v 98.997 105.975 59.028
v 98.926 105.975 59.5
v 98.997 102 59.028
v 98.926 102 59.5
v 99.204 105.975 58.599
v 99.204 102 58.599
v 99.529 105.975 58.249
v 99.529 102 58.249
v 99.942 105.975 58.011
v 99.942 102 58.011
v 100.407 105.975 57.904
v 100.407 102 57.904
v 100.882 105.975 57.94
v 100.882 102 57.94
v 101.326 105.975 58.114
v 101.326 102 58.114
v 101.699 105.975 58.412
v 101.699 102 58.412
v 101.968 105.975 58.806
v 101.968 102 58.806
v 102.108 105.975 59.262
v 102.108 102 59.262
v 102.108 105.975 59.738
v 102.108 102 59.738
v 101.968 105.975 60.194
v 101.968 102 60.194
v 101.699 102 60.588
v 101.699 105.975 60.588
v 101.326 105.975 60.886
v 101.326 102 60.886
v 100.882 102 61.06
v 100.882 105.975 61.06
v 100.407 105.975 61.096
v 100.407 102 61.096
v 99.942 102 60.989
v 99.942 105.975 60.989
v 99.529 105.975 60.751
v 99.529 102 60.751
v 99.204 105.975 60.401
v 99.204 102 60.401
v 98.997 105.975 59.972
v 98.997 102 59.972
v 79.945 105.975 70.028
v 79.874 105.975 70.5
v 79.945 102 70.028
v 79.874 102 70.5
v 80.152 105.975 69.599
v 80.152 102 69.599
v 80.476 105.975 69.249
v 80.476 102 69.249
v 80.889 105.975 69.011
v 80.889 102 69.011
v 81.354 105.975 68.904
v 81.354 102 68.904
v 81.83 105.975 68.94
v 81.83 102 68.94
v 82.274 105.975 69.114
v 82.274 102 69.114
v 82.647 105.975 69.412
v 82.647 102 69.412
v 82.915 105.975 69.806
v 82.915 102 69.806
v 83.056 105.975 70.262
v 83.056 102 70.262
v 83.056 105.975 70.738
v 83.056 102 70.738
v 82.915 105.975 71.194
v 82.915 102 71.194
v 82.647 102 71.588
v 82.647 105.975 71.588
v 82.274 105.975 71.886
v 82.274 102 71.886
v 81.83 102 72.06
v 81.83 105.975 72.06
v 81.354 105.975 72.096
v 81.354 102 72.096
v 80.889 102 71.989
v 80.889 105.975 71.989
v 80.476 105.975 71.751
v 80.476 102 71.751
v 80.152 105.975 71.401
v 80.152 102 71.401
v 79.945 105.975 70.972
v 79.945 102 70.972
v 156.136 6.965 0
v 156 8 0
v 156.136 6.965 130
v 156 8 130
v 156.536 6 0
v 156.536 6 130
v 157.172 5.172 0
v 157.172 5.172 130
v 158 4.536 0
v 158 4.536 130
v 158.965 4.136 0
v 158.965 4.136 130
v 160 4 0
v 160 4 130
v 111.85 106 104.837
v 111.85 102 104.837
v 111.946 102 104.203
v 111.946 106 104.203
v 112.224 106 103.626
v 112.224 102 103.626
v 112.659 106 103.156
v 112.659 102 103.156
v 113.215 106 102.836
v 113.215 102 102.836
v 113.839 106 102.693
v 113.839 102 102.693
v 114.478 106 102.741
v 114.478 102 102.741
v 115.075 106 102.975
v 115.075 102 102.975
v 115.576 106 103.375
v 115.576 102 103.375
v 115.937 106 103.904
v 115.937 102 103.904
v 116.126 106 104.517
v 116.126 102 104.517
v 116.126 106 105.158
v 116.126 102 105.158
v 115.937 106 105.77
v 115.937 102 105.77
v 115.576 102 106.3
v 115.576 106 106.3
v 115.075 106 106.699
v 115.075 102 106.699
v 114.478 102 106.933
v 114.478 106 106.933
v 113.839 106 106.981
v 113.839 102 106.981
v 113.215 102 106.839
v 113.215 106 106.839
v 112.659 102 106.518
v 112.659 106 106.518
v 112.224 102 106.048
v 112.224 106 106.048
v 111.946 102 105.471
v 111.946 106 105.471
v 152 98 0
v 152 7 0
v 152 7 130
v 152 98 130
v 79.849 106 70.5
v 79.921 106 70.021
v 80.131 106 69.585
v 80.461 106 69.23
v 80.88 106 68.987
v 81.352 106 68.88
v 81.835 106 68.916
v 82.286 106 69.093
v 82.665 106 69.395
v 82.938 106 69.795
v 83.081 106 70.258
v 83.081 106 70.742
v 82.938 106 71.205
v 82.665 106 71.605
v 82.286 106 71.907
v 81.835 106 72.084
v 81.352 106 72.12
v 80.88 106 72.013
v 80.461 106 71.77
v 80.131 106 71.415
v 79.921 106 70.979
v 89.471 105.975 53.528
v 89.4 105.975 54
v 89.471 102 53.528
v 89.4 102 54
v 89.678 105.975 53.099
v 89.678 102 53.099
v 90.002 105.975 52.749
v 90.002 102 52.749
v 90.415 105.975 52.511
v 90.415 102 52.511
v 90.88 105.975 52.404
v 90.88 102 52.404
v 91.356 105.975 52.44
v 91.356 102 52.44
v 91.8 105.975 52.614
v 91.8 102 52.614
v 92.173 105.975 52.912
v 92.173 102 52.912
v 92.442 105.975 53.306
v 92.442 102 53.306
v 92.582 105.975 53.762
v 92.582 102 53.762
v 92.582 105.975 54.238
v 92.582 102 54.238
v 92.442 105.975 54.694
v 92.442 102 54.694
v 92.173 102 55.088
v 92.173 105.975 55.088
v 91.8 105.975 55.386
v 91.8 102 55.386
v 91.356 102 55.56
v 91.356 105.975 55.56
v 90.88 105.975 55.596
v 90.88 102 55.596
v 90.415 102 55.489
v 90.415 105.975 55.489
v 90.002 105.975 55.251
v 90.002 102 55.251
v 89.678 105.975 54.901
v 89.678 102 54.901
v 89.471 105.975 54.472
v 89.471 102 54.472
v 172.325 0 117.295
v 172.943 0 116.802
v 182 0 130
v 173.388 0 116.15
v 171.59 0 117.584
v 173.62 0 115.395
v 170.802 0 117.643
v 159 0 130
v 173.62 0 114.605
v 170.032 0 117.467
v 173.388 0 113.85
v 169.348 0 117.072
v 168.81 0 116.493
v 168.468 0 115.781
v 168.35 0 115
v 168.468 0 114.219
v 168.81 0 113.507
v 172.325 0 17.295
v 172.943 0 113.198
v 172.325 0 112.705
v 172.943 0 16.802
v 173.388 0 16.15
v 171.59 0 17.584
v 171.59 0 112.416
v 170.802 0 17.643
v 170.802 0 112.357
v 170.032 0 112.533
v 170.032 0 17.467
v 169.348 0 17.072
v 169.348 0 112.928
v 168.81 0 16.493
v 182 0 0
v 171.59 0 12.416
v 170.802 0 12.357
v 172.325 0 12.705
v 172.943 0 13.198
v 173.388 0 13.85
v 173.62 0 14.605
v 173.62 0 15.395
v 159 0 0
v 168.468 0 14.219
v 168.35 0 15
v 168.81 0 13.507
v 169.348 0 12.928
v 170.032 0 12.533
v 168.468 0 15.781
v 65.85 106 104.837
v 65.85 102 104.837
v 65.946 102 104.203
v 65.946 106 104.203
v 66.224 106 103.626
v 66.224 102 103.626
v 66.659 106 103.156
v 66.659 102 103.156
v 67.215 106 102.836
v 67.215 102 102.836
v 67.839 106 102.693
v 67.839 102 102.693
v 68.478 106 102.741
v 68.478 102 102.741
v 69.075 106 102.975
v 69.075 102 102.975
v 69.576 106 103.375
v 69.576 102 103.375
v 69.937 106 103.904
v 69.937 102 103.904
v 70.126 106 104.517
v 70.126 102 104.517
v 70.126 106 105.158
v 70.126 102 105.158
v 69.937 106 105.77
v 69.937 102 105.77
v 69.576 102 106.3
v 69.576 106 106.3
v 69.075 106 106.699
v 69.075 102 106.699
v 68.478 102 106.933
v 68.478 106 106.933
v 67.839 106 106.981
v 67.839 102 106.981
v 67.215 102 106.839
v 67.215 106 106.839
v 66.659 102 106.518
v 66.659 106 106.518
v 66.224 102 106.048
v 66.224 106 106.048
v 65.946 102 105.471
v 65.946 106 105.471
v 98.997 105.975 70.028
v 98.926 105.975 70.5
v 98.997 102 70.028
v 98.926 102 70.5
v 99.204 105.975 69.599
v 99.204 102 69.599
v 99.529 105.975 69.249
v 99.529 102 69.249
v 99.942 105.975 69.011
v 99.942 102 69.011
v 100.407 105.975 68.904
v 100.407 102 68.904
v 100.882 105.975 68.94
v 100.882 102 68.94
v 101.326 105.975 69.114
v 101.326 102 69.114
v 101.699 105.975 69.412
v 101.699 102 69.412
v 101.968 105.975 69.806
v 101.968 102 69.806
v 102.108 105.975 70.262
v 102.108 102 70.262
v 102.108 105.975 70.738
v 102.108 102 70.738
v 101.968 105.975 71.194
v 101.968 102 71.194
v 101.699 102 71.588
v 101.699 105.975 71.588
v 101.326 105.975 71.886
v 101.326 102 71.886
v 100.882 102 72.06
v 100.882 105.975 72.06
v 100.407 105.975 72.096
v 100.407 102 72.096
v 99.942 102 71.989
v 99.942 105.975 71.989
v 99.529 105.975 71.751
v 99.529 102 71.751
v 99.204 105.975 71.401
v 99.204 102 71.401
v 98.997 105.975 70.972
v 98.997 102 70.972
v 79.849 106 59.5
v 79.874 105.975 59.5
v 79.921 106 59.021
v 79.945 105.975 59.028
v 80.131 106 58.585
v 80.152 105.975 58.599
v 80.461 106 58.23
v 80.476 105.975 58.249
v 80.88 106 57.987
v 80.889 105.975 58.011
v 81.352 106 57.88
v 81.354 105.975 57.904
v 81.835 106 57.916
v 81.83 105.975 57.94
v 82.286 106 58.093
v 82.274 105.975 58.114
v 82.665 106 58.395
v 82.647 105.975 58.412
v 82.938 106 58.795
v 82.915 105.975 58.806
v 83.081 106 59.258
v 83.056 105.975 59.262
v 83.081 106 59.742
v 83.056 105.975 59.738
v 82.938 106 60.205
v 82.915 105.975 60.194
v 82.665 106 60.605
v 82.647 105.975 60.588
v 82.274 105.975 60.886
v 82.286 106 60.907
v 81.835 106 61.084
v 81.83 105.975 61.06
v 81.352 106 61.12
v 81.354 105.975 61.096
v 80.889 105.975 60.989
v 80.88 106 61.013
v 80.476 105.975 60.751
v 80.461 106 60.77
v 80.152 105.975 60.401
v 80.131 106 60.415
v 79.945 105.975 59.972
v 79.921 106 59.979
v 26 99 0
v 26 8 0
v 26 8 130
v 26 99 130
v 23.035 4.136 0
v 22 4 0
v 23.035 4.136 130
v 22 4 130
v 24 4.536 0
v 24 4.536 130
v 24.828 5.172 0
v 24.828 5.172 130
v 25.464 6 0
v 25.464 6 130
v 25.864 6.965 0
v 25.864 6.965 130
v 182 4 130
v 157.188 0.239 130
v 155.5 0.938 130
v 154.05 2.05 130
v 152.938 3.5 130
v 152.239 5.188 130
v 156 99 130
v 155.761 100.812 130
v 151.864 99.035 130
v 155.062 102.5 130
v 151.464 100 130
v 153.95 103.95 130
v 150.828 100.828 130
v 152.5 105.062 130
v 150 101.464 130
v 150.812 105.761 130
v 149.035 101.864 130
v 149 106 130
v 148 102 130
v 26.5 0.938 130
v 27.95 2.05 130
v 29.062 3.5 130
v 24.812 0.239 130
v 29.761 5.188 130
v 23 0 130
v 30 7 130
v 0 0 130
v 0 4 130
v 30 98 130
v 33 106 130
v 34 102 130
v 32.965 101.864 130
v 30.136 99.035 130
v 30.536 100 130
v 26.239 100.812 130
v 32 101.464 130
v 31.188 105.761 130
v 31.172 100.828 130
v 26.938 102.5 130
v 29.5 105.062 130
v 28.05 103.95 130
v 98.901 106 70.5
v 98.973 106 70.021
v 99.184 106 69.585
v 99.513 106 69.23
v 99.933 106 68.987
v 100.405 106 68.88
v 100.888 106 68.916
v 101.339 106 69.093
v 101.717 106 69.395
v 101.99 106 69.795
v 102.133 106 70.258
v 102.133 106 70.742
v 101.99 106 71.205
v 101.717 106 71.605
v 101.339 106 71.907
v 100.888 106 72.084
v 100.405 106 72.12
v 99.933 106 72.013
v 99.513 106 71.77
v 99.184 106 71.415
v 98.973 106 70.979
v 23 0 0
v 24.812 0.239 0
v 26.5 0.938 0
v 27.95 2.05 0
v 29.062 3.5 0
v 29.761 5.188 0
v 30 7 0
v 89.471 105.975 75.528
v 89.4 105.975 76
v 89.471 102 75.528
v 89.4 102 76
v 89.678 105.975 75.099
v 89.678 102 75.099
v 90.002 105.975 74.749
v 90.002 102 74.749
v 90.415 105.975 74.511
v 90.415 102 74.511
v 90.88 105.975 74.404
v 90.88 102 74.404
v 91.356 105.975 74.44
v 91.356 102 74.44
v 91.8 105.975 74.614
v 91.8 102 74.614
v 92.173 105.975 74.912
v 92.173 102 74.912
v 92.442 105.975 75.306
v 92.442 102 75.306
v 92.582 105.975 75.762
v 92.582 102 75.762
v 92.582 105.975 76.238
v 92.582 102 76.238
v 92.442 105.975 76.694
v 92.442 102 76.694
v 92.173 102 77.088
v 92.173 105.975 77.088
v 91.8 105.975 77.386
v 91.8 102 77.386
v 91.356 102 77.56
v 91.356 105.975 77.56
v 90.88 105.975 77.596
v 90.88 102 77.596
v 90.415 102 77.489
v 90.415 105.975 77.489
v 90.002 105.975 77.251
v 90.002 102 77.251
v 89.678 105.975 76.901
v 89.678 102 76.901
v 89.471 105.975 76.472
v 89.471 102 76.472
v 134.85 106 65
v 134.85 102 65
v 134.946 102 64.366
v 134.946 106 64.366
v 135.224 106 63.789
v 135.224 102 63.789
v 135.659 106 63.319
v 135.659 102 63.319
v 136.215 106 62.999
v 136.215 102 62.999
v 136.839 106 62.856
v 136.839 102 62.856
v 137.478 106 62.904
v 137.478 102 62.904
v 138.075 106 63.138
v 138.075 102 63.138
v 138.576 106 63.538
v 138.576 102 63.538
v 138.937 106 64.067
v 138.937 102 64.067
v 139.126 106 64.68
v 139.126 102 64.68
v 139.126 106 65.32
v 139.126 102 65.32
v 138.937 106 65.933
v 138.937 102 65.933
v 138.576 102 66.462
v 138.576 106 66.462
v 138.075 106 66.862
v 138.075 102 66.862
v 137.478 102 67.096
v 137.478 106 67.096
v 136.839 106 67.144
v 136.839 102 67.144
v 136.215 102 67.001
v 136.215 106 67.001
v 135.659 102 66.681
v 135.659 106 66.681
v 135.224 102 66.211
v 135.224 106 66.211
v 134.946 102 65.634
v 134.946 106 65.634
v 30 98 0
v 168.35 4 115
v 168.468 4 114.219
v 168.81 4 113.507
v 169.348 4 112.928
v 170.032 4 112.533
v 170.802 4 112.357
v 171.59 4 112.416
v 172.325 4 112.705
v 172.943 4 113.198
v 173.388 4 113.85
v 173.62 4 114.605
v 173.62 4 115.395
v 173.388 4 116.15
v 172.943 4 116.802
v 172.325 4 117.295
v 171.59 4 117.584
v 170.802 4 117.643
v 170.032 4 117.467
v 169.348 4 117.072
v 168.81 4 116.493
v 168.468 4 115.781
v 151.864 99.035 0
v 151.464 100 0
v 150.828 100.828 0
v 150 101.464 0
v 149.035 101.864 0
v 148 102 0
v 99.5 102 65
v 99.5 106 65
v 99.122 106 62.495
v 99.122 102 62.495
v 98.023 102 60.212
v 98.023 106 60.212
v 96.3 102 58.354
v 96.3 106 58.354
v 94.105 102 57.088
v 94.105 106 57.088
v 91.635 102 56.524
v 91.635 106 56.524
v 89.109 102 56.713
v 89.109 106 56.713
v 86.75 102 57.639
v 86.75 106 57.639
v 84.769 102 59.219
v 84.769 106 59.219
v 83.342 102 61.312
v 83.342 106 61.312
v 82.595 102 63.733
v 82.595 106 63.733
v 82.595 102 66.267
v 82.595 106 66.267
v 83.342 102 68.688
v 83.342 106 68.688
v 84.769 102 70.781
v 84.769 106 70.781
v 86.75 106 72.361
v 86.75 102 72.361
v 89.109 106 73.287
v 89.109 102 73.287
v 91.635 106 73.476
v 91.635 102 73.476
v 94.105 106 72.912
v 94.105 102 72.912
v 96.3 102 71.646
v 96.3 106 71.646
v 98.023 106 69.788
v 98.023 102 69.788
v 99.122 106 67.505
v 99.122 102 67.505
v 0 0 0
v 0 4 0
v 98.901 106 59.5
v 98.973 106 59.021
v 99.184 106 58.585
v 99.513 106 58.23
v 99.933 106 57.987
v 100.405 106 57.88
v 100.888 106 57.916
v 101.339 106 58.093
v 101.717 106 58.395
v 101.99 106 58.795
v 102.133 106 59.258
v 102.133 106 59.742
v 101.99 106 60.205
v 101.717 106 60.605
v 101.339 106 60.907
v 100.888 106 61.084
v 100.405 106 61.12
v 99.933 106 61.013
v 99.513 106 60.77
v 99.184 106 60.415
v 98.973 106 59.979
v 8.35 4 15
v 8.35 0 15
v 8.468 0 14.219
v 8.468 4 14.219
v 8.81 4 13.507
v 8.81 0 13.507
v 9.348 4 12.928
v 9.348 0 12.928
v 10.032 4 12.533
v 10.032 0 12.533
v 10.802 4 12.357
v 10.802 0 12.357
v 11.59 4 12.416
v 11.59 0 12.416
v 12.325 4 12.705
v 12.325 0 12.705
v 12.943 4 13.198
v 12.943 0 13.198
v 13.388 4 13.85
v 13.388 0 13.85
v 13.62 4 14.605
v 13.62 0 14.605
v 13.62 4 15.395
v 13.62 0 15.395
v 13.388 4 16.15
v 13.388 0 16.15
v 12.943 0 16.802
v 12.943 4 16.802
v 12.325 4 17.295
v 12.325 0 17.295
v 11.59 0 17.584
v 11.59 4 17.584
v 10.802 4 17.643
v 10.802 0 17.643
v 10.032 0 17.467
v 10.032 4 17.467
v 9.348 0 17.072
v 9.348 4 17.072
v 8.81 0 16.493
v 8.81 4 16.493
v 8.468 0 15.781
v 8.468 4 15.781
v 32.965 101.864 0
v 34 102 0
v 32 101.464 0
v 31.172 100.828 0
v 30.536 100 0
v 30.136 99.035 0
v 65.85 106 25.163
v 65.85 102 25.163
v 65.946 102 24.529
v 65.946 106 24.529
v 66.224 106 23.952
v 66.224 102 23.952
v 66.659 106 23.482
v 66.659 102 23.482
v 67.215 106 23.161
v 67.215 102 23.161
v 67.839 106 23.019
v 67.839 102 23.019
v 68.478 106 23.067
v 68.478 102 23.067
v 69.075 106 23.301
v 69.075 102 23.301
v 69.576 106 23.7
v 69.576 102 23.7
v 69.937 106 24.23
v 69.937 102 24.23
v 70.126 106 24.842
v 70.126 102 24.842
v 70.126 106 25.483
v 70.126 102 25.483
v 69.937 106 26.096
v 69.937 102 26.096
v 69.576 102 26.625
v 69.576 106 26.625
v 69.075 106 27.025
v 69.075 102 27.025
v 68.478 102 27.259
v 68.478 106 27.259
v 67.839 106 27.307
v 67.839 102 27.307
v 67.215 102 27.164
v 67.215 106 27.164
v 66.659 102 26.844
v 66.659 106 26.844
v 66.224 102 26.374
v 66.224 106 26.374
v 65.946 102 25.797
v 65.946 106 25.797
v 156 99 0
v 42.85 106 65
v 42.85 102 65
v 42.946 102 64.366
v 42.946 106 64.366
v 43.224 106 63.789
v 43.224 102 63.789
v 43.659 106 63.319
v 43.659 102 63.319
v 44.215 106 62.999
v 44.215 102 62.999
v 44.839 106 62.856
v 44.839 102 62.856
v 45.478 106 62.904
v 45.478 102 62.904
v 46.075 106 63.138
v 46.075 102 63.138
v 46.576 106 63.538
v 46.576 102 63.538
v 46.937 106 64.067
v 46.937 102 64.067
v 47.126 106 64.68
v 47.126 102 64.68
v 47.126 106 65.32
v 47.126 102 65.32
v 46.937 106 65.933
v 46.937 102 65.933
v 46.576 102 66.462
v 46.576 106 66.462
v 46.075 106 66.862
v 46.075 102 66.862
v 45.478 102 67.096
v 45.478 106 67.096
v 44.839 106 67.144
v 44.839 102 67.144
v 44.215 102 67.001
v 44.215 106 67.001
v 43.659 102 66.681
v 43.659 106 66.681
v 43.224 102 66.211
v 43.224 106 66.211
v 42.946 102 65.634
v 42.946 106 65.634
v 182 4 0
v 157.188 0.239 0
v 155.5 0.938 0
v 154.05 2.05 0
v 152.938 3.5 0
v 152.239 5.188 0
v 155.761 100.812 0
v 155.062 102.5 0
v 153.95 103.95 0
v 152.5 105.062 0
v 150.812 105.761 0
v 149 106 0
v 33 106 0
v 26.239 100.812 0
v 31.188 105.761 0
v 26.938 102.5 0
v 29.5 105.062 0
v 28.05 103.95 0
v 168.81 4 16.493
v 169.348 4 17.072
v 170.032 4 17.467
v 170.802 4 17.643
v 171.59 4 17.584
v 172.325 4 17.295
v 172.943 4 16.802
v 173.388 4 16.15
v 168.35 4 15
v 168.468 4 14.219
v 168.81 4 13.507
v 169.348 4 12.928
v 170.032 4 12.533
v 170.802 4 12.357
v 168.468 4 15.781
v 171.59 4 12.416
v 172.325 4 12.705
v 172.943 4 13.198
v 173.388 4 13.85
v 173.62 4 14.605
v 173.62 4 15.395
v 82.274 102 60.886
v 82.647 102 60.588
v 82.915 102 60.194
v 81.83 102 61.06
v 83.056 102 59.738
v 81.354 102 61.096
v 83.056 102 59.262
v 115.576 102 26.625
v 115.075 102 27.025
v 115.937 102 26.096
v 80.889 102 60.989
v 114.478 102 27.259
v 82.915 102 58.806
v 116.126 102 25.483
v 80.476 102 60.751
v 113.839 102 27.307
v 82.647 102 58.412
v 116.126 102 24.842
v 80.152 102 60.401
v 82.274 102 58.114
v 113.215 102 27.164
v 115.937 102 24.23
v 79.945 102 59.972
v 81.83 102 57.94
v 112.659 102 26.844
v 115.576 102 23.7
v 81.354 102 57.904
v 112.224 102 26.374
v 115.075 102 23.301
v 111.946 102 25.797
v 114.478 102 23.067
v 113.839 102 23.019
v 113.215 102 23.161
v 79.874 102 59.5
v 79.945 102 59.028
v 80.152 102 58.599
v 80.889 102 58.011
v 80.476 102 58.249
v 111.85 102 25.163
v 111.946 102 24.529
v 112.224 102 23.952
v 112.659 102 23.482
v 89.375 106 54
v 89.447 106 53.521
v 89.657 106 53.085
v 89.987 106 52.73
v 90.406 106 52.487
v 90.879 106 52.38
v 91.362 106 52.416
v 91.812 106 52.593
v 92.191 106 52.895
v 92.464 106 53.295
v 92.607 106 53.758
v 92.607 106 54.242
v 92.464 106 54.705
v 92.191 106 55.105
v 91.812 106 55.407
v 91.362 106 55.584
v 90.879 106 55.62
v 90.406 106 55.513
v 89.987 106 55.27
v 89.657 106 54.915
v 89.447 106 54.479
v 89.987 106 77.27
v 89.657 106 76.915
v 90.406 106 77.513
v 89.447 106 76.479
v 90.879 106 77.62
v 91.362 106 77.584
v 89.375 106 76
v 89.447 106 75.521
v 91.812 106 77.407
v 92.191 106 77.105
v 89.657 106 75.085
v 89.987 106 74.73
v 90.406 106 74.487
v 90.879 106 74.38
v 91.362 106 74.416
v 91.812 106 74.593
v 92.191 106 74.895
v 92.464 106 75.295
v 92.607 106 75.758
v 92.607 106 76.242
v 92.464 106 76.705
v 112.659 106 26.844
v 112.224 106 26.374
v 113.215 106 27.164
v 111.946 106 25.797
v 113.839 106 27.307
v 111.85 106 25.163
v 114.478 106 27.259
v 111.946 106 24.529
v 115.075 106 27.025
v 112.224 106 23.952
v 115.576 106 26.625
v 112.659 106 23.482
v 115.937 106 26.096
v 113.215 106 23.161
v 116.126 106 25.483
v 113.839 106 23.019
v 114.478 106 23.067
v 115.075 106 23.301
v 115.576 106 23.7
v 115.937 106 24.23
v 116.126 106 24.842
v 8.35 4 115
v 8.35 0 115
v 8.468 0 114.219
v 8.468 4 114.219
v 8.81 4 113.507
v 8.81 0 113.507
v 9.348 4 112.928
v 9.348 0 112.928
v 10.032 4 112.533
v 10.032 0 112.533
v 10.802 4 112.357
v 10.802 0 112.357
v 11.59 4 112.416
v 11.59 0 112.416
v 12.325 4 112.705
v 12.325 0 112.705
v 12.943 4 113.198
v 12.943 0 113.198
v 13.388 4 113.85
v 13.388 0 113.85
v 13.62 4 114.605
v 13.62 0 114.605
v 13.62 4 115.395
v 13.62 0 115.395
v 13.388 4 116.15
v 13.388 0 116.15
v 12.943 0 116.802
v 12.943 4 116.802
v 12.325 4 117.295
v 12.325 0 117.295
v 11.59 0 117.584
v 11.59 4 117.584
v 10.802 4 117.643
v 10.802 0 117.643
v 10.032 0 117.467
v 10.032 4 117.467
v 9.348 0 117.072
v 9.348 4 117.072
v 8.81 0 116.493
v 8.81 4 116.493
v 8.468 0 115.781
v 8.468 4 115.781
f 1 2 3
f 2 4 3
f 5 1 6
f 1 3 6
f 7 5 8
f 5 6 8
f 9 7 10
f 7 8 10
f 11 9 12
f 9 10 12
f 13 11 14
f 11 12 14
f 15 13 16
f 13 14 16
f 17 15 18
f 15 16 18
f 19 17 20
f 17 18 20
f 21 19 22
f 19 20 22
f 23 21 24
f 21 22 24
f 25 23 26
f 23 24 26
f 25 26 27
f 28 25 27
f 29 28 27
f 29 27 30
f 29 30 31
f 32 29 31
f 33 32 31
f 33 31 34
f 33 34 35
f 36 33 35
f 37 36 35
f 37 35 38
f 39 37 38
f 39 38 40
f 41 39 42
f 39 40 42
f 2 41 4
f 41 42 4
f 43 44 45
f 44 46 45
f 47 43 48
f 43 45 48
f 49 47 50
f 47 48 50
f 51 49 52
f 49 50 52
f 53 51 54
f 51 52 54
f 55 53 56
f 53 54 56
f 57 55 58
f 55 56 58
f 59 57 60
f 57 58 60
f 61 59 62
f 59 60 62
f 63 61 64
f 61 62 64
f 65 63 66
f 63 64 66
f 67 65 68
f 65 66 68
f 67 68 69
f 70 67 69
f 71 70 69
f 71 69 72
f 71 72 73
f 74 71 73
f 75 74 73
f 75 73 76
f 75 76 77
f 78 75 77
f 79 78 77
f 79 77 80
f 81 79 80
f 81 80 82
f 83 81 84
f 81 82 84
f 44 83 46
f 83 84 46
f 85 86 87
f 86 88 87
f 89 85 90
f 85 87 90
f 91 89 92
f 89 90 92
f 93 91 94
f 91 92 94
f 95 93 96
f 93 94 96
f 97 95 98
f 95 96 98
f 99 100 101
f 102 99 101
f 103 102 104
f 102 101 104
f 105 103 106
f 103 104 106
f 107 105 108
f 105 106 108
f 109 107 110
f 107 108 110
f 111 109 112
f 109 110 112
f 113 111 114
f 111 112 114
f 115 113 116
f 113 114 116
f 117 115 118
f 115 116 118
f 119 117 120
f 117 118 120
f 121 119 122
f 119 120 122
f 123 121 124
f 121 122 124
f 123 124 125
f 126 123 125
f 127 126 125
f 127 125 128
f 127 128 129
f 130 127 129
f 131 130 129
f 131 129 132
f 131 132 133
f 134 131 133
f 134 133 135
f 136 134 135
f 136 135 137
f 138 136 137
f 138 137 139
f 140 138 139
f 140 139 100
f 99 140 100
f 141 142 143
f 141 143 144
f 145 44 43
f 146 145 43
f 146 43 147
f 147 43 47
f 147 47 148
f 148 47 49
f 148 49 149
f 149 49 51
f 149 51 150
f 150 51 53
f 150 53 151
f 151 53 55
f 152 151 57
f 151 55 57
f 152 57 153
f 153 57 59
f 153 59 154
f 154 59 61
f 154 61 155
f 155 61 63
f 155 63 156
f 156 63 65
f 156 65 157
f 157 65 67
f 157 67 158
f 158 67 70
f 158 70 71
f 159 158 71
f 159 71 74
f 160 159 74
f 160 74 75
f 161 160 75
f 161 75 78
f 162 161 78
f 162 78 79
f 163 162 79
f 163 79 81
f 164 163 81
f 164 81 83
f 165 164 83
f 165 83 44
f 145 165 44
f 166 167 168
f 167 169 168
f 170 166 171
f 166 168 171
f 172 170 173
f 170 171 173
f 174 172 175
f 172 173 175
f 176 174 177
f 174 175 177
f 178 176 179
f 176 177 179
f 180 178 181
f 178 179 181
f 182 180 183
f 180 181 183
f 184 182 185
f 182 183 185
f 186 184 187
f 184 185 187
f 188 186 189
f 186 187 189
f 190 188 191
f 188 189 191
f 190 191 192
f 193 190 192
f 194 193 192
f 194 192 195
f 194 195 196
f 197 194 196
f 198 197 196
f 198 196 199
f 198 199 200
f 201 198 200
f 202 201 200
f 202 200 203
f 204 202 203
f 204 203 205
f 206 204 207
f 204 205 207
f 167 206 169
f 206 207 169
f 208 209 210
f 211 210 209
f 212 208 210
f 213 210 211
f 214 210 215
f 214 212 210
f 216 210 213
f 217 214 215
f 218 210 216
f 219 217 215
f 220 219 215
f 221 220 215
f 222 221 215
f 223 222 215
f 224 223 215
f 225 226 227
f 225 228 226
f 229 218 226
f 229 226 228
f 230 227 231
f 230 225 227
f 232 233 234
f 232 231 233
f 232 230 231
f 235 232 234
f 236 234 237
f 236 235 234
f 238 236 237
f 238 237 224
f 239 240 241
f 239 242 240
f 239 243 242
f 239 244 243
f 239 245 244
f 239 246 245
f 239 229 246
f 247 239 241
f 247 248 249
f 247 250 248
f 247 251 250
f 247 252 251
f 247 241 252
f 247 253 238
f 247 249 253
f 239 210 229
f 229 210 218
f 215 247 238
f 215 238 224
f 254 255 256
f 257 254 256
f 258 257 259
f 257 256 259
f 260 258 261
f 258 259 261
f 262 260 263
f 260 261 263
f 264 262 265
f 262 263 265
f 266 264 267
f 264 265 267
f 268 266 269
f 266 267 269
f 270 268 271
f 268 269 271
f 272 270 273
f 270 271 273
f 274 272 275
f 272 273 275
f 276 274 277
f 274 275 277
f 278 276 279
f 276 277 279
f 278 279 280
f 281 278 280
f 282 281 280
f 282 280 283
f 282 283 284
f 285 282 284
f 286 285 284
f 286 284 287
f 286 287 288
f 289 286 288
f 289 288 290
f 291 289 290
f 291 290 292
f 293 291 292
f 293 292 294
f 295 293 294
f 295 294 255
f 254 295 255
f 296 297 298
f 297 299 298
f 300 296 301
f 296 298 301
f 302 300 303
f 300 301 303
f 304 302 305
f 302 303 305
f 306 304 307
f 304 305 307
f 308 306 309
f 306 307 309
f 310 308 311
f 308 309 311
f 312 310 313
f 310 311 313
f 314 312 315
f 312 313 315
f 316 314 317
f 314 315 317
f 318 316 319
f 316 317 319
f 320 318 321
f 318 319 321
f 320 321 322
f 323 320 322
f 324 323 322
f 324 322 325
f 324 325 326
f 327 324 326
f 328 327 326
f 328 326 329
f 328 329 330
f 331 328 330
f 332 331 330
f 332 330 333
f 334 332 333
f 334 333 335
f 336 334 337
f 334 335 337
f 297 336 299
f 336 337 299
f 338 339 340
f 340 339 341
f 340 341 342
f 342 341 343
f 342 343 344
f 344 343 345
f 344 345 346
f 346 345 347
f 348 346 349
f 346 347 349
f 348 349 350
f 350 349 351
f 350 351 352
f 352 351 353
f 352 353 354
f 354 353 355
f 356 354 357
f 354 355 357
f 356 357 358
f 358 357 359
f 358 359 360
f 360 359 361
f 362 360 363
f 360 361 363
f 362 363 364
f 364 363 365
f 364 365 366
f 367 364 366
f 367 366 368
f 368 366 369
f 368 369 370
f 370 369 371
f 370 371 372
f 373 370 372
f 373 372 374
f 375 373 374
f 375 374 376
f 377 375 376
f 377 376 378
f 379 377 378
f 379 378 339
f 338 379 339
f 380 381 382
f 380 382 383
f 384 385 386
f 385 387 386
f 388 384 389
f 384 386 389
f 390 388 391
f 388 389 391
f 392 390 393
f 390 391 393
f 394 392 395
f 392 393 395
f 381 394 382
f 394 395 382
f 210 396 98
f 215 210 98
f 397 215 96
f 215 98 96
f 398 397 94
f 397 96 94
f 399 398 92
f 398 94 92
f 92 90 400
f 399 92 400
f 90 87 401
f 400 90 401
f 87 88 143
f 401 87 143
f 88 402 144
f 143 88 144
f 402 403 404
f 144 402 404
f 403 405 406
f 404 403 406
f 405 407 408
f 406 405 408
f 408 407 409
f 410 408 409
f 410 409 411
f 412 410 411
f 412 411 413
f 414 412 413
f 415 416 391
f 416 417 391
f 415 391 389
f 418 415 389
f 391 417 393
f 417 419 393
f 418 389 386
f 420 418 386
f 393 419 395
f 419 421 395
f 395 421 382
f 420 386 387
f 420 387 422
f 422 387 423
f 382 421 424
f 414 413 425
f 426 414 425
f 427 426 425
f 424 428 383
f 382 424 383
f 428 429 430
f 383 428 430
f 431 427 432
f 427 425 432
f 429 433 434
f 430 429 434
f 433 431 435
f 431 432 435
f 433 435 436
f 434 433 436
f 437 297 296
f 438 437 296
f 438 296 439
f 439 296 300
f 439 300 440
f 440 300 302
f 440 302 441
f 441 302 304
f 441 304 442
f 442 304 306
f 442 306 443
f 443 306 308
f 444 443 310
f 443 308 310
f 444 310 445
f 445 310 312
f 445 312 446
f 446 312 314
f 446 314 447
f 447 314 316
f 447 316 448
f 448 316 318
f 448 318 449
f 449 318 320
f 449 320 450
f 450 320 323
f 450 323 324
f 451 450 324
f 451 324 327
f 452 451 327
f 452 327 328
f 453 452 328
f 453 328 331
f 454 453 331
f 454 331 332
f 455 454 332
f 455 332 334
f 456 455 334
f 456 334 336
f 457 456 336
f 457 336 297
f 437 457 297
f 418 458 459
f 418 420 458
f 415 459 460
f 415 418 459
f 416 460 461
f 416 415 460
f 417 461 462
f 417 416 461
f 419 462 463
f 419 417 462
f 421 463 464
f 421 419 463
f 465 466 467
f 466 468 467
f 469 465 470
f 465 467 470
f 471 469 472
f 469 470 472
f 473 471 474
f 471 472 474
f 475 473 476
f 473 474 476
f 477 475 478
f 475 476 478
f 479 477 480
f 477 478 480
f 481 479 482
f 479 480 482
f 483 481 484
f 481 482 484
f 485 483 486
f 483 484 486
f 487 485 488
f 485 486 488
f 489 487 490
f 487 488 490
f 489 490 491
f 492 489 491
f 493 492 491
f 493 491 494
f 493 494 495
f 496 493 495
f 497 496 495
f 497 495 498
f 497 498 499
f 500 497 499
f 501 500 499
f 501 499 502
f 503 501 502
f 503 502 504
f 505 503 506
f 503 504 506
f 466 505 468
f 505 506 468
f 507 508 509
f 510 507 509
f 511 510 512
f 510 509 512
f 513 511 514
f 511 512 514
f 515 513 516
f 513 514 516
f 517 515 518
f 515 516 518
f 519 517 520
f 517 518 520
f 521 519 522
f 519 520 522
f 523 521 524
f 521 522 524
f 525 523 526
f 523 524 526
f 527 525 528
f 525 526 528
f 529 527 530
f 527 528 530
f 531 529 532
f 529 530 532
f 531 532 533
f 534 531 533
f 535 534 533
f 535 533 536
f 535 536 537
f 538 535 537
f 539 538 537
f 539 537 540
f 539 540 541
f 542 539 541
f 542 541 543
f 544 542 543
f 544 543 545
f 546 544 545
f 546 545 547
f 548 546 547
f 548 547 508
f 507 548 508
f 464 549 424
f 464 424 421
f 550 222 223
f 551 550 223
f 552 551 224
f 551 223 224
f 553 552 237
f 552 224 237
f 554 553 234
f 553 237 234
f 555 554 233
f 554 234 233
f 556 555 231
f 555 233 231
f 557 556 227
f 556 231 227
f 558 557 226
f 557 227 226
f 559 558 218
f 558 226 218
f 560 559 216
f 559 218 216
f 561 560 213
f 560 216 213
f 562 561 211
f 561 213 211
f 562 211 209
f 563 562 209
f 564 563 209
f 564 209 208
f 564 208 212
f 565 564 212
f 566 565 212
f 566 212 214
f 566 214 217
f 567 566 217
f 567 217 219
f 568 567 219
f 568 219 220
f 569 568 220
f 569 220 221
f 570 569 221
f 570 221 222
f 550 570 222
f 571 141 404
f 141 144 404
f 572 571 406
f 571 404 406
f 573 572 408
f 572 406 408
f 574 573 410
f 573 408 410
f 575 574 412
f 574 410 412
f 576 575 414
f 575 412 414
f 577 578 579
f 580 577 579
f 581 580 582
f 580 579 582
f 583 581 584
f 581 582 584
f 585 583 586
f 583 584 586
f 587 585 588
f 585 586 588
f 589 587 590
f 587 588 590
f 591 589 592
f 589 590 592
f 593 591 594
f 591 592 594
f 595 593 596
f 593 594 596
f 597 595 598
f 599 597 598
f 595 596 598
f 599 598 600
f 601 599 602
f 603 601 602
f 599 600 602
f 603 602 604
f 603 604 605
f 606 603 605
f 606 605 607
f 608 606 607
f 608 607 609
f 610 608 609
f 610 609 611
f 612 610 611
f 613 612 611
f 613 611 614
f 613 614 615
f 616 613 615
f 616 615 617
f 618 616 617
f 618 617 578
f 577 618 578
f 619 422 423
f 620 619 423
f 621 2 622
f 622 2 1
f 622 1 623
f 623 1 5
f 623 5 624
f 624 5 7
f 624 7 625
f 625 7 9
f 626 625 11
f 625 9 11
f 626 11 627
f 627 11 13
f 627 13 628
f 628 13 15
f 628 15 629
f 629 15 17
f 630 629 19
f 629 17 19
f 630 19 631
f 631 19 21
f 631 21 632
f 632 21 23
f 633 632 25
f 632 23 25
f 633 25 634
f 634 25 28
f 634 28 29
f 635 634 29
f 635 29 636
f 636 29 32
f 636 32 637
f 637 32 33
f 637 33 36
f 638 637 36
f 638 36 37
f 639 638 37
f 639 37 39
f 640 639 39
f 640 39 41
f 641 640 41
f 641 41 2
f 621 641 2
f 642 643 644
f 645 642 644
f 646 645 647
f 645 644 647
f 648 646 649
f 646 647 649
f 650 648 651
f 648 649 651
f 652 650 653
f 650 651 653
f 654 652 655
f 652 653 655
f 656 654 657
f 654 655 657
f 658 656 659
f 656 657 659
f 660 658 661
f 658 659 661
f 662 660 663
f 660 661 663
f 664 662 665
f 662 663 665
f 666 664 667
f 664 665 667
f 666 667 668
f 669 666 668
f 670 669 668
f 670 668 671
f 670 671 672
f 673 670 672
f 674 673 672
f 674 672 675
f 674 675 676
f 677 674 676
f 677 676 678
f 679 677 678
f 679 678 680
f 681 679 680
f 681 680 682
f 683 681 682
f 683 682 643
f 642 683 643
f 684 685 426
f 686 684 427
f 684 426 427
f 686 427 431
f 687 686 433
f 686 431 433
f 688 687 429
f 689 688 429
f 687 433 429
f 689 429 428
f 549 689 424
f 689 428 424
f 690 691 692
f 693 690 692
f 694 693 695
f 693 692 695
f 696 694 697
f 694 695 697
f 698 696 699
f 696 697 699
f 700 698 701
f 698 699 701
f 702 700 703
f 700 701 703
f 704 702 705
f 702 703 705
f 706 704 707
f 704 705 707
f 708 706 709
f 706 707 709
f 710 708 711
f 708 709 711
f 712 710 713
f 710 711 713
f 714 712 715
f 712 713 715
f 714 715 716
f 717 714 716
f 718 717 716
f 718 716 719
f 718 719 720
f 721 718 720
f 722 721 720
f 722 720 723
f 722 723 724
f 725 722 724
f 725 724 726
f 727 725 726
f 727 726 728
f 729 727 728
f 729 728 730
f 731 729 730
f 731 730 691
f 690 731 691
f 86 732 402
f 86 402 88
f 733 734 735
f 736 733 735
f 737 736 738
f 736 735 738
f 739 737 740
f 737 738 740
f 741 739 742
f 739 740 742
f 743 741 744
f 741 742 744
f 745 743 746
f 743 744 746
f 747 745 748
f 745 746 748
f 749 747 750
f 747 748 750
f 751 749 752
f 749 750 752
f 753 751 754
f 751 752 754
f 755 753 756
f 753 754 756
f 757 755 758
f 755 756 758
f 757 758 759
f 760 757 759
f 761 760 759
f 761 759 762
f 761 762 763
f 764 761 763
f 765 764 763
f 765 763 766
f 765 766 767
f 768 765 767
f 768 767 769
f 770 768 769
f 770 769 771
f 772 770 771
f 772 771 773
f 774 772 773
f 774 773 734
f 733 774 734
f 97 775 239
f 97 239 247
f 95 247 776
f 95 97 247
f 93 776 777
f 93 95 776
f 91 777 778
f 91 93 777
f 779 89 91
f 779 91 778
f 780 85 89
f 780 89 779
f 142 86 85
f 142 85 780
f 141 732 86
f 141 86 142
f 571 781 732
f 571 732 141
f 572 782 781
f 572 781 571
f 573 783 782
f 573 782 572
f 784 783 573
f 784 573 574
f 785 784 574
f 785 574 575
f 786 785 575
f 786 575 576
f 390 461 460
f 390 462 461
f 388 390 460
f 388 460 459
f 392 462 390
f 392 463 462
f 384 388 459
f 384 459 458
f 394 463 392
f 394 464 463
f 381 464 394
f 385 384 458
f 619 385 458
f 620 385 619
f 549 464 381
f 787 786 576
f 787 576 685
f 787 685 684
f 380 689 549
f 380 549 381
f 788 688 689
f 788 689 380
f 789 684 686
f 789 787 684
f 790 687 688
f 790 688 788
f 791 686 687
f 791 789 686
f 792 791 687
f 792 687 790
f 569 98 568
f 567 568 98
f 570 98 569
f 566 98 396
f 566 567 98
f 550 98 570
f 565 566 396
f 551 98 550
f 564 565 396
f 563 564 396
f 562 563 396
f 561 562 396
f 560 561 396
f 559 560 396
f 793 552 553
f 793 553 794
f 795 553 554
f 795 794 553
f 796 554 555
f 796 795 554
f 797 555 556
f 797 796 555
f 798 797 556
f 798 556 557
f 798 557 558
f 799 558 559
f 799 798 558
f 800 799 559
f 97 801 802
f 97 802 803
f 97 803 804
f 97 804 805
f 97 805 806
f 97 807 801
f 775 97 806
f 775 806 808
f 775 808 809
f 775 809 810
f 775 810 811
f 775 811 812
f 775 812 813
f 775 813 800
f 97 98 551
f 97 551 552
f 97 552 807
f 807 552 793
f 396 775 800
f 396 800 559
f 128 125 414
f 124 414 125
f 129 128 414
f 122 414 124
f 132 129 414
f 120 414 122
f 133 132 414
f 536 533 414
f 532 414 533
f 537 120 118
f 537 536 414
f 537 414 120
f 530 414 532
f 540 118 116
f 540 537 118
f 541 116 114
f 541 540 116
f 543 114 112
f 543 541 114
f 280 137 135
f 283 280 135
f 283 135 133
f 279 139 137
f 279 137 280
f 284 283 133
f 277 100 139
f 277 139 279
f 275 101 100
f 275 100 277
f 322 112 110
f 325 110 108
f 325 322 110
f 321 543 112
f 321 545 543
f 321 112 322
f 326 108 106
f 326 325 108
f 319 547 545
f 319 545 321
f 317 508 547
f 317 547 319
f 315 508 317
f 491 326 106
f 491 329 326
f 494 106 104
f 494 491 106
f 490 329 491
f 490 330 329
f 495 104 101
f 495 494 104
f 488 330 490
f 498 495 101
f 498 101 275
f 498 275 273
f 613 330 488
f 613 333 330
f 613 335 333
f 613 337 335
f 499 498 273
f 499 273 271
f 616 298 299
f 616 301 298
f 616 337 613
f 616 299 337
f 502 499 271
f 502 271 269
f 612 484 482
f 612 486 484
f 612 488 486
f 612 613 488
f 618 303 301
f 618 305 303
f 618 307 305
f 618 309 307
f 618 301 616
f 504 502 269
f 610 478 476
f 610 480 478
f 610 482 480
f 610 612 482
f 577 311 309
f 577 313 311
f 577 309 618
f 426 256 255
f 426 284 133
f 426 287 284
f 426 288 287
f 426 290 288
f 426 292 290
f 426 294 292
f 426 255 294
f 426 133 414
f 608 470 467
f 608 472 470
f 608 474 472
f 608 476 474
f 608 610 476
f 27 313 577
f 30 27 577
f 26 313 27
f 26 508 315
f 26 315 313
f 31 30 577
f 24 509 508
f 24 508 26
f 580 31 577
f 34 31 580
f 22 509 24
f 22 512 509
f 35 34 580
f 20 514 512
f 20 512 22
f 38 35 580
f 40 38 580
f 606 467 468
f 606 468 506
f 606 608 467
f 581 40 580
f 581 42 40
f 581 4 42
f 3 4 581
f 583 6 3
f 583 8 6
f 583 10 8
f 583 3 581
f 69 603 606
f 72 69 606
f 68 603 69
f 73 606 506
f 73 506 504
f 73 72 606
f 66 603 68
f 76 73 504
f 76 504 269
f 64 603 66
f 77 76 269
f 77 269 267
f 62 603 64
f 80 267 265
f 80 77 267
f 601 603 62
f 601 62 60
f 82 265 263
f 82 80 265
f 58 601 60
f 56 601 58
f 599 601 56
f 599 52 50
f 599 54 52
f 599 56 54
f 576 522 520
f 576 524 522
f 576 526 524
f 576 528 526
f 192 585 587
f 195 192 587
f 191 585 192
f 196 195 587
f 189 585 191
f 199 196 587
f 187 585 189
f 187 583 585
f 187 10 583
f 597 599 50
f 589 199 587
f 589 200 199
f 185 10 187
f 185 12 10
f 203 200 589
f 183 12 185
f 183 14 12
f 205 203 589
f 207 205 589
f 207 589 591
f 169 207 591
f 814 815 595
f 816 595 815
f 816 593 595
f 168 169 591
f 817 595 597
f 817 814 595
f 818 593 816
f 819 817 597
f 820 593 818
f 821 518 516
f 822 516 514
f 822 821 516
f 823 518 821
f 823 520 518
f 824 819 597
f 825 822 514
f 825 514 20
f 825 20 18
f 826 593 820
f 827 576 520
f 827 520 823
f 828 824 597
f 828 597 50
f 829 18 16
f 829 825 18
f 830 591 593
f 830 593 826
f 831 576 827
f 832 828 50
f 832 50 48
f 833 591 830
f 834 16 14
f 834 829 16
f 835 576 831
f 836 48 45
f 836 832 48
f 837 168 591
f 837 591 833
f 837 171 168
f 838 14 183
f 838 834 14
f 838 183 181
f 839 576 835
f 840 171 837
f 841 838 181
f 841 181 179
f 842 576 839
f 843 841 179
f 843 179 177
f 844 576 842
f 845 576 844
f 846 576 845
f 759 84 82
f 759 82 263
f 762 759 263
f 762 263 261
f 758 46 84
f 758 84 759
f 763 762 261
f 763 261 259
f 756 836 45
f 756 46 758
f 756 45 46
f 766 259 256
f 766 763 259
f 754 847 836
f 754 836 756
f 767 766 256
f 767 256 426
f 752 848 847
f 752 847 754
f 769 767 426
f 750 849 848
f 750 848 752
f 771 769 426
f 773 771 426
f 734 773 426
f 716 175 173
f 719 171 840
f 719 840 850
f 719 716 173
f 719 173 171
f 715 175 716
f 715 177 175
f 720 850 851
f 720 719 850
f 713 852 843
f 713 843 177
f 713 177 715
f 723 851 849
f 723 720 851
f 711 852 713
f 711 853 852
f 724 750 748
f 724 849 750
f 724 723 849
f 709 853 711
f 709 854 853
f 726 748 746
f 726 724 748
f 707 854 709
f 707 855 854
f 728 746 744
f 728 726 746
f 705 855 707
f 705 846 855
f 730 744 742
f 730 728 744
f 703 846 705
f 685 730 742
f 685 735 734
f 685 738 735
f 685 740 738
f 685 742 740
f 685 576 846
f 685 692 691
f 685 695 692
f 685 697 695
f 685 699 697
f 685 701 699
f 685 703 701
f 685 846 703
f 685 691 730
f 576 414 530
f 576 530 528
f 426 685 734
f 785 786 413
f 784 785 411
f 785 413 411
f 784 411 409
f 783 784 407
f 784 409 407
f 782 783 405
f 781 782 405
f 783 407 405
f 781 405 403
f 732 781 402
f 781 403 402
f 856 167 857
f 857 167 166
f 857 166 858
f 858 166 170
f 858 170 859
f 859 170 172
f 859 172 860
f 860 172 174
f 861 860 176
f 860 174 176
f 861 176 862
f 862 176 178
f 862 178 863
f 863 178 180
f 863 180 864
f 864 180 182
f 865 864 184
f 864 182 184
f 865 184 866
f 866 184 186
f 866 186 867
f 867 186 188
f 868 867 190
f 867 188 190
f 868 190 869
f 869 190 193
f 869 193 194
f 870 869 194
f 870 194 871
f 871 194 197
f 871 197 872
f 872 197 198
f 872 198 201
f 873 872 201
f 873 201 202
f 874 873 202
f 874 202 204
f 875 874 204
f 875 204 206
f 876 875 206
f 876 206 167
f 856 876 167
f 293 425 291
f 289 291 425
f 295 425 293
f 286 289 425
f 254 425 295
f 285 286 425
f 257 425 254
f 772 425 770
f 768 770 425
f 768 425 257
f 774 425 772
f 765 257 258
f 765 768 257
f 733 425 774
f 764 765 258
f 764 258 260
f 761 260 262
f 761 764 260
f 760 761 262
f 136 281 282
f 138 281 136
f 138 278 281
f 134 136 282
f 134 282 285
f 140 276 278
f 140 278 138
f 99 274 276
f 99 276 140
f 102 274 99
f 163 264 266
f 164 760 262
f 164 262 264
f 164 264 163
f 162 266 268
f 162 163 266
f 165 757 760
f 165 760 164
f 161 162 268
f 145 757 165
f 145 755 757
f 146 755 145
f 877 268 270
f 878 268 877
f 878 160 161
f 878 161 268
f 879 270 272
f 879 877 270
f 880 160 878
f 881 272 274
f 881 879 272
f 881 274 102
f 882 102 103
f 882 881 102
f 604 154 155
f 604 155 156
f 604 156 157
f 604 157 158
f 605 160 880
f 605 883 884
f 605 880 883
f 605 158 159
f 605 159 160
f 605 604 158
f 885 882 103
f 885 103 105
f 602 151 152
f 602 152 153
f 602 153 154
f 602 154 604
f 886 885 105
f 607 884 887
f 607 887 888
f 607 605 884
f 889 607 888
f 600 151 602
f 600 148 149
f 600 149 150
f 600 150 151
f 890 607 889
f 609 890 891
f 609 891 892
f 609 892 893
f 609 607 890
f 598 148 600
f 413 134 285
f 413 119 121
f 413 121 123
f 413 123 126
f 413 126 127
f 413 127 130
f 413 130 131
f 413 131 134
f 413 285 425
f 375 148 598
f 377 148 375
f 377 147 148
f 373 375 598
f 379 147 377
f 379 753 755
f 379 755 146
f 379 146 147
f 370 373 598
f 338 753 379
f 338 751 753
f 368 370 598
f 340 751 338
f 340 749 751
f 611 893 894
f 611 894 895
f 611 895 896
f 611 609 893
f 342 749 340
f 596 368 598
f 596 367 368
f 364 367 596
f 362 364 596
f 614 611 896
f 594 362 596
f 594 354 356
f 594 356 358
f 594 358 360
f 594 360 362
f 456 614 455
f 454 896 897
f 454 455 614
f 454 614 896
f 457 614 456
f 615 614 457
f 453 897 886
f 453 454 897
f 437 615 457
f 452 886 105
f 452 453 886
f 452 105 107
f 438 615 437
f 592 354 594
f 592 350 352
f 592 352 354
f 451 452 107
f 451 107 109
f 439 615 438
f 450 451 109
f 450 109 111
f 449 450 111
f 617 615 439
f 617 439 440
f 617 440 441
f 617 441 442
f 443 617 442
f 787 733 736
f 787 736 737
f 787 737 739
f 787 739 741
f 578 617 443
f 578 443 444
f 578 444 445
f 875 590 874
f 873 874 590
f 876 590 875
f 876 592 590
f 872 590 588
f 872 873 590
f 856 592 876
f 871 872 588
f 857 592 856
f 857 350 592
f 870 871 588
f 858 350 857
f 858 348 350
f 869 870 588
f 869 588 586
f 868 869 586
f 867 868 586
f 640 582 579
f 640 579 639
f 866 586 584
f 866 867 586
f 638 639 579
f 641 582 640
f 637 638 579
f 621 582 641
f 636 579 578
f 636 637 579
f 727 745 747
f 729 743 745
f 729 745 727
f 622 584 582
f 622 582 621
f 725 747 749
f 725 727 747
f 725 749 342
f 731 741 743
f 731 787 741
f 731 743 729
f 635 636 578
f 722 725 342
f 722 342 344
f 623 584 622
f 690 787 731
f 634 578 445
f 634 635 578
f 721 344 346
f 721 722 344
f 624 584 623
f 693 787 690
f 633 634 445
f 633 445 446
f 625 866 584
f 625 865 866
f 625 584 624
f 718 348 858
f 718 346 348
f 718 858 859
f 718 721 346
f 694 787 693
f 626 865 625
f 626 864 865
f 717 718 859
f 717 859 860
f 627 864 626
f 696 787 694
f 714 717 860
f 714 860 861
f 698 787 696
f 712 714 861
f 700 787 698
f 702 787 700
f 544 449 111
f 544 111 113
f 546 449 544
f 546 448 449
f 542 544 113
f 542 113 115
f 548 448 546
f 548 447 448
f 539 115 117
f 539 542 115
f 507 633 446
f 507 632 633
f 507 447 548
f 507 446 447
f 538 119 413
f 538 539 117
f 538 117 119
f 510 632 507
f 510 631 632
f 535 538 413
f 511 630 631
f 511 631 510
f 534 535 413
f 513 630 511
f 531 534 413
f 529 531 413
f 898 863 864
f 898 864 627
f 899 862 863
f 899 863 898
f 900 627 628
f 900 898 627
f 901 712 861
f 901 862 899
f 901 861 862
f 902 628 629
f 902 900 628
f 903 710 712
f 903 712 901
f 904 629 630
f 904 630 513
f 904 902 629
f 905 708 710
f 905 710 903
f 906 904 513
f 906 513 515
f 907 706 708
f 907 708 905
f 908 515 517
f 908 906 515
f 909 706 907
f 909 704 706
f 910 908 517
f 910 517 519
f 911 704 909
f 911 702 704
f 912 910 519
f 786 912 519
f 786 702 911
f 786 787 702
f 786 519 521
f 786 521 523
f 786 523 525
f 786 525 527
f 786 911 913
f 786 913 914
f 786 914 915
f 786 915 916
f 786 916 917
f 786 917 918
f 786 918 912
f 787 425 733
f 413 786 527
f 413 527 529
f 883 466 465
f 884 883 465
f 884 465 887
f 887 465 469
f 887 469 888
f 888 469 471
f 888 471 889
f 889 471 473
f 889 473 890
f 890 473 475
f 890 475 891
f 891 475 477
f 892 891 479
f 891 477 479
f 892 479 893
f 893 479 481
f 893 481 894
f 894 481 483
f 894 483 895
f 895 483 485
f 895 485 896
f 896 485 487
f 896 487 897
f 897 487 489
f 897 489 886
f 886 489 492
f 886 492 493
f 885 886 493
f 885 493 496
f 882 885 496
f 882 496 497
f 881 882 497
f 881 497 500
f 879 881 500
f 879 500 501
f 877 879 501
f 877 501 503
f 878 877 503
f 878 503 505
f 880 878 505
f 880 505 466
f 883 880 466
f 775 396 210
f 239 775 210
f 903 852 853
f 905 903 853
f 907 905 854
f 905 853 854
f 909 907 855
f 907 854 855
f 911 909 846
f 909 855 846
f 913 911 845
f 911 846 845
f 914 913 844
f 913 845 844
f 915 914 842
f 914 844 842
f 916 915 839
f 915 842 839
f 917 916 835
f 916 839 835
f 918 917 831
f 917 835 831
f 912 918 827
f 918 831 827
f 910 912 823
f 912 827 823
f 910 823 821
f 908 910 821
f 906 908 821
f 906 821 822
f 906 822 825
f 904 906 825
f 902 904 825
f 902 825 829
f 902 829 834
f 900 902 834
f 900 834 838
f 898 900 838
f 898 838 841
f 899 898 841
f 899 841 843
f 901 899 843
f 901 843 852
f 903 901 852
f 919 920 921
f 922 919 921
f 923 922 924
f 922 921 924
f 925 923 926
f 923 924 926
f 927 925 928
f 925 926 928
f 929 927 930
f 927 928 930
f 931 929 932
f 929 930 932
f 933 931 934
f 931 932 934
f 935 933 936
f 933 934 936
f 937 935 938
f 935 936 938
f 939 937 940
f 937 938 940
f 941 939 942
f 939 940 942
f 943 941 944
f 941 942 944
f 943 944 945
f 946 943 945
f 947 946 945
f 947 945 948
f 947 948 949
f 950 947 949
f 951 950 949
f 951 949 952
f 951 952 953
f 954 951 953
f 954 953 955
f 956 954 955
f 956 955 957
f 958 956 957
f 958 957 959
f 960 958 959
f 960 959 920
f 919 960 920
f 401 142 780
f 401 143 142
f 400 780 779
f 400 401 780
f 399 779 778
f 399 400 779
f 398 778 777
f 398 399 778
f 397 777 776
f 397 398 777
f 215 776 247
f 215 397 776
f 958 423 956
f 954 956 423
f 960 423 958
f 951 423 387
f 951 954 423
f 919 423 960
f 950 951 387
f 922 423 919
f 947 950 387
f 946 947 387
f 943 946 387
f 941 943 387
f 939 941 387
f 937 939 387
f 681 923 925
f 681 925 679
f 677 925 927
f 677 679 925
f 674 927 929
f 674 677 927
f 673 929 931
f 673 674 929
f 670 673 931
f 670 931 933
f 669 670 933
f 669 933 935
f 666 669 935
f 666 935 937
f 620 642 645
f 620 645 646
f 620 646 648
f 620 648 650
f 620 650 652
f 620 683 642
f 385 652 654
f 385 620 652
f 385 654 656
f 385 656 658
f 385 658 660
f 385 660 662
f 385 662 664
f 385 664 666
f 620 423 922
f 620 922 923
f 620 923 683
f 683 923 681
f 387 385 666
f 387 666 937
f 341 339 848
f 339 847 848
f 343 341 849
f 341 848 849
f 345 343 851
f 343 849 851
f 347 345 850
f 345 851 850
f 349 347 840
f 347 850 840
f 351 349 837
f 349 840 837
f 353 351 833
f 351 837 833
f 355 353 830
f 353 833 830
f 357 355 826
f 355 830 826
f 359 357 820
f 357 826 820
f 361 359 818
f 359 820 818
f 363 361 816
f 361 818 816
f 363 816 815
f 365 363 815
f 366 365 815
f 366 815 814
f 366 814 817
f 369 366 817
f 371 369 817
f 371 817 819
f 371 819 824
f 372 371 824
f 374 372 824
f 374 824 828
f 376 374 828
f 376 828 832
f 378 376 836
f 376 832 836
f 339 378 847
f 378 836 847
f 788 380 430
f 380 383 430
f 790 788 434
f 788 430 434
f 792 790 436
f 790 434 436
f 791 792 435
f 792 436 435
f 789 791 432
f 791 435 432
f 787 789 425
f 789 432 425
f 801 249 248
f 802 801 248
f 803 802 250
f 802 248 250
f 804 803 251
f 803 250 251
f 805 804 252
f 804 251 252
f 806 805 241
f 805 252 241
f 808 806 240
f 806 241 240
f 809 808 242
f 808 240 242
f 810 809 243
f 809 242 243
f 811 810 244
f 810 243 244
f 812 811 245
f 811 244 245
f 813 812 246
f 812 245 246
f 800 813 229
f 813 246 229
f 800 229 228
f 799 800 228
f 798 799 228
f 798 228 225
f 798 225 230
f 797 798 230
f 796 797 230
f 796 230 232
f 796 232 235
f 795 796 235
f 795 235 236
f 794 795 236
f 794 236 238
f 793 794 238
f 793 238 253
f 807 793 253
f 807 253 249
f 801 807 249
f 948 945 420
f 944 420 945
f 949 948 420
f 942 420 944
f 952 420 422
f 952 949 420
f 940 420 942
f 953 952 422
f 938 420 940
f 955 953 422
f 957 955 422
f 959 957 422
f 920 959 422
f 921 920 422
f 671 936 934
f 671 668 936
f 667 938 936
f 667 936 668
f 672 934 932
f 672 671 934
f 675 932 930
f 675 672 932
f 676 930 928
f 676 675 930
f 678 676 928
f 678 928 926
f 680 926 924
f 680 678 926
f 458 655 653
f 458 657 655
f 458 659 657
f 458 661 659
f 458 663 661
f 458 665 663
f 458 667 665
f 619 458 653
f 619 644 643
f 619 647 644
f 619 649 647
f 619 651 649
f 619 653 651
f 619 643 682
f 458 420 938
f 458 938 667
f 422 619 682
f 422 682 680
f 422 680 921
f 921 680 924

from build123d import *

# Parameters (mm, degrees)
BOSS_EXTRUDE1_DEPTH            = 130
FILLET1_R                      = 4
FILLET2_R                      = 7
SKETCH2_R                      = 8.5
CUT_EXTRUDE1_DEPTH             = 100
M3_CLEARANCE_HOLE1_D           = 3.2
M3_CLEARANCE_HOLE1_CSINK_D     = 3.25
M3_CLEARANCE_HOLE1_CSINK_ANGLE = 90
M4_CLEARANCE_HOLE1_D           = 4.3
M4_CLEARANCE_HOLE1_DEPTH       = 100
M4_CLEARANCE_HOLE1_TIP         = 1.291850331
M5_CLEARANCE_HOLE2_D           = 5.3
M5_CLEARANCE_HOLE2_DEPTH       = 100
M5_CLEARANCE_HOLE2_TIP         = 1.59228064


with BuildPart() as part:
    # Sketch1 → Boss-Extrude1 (new body)
    with BuildSketch(Plane.XY):
        Polygon((0, 4), (26, 4), (26, 106), (156, 106), (156, 4), (182, 4), (182, 0), (152, 0), (152, 102), (30, 102), (30, 0), (0, 0), align=None)
    extrude(amount=BOSS_EXTRUDE1_DEPTH)

    # Fillet1
    fillet1_edges = [part.edges().sort_by_distance(p)[0] for p in [
        (26, 4, 65),
        (156, 4, 65),
        (152, 102, 65),
        (30, 102, 65),
    ]]
    fillet(fillet1_edges, radius=FILLET1_R)

    # Fillet2
    fillet2_edges = [part.edges().sort_by_distance(p)[0] for p in [
        (26, 106, 65),
        (156, 106, 65),
        (152, 0, 65),
        (30, 0, 65),
    ]]
    fillet(fillet2_edges, radius=FILLET2_R)

    # Sketch2 → Cut-Extrude1 (cut)
    with BuildSketch(Plane(origin=(0, 106, 0), x_dir=(1, 0, 0), z_dir=(0, 1, 0))):
        with Locations((91, -65)):
            Circle(SKETCH2_R)
    extrude(amount=-CUT_EXTRUDE1_DEPTH, mode=Mode.SUBTRACT)

    # M3 Clearance Hole1 (through all)
    with Locations(Plane(origin=(0, 106, 0), x_dir=(1, 0, 0), z_dir=(0, 1, 0))):
        with Locations((91, -54), (100.526279442, -59.5), (100.526279442, -70.5), (91, -76), (81.473720558, -70.5), (81.473720558, -59.5), (91, -65)):
            CounterSinkHole(M3_CLEARANCE_HOLE1_D / 2, M3_CLEARANCE_HOLE1_CSINK_D / 2, counter_sink_angle=M3_CLEARANCE_HOLE1_CSINK_ANGLE)

    # M4 Clearance Hole1
    with Locations(Plane(origin=(0, 106, 0), x_dir=(1, 0, 0), z_dir=(0, 1, 0))):
        with Locations((137, -65), (114, -104.837168574), (68, -104.837168574), (45, -65), (68, -25.162831426), (114, -25.162831426), (91, -65)):
            Hole(M4_CLEARANCE_HOLE1_D / 2, depth=M4_CLEARANCE_HOLE1_DEPTH)
            with Locations((0, 0, -(M4_CLEARANCE_HOLE1_DEPTH + M4_CLEARANCE_HOLE1_TIP / 2))):  # 118° drill point
                Cone(0, M4_CLEARANCE_HOLE1_D / 2, M4_CLEARANCE_HOLE1_TIP, mode=Mode.SUBTRACT)

    # M5 Clearance Hole2
    with Locations(Plane(origin=(0, 4, 0), x_dir=(1, 0, 0), z_dir=(0, 1, 0))):
        with Locations((11, -15), (11, -115), (171, -115), (171, -15)):
            Hole(M5_CLEARANCE_HOLE2_D / 2, depth=M5_CLEARANCE_HOLE2_DEPTH)
            with Locations((0, 0, -(M5_CLEARANCE_HOLE2_DEPTH + M5_CLEARANCE_HOLE2_TIP / 2))):  # 118° drill point
                Cone(0, M5_CLEARANCE_HOLE2_D / 2, M5_CLEARANCE_HOLE2_TIP, mode=Mode.SUBTRACT)


solid = part.part
